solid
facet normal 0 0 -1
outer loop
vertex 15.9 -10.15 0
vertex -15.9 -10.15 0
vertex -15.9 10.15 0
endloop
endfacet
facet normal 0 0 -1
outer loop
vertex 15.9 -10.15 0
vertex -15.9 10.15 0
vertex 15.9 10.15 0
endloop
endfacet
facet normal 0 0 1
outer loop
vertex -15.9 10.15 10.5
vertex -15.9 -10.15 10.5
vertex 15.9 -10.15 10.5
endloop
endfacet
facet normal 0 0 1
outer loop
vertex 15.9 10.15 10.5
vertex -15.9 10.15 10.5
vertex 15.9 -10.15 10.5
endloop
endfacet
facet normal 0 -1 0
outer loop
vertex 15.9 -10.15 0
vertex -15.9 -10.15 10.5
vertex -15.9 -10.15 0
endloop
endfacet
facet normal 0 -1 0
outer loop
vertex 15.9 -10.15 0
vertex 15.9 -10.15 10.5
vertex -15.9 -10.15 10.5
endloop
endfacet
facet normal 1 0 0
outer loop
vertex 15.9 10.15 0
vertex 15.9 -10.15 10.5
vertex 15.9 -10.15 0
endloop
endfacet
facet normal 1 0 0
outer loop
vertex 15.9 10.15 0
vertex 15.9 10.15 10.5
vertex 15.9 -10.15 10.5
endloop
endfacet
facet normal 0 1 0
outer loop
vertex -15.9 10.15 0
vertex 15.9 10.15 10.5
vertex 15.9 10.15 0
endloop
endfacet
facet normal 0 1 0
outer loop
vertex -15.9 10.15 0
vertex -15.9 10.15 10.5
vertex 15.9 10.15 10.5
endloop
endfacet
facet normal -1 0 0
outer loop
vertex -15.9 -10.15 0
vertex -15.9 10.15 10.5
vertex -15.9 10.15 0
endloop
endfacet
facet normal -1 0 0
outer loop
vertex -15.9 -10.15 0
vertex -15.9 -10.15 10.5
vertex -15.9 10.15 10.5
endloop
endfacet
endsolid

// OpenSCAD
// Datheet: https://www.tme.eu/Document/dbc573554d903d2de79b1454bccf4b94/thi3-datasheet.pdf

CHASSIS_X_LENGTH = 31.8;
CHASSIS_Y_LENGTH = 20.3;
CHASSIS_Z_LENGTH = 10.5;

// Increase steps in render to have quality circles
$fs=0.01;


module Screw() {
    translate([0,0,SCREW_RADIUS])
        rotate([270, 0])
            linear_extrude(height = SOCKET_LENGTH, convexity = 10, twist = 0)
                circle(SCREW_RADIUS);
}

module Isolator() {
    translate([-CHASSIS_X_LENGTH/2, -CHASSIS_Y_LENGTH/2,0])
    linear_extrude(height = CHASSIS_Z_LENGTH, convexity = 10, twist = 0)
        square([CHASSIS_X_LENGTH,CHASSIS_Y_LENGTH]);
}

Isolator();
